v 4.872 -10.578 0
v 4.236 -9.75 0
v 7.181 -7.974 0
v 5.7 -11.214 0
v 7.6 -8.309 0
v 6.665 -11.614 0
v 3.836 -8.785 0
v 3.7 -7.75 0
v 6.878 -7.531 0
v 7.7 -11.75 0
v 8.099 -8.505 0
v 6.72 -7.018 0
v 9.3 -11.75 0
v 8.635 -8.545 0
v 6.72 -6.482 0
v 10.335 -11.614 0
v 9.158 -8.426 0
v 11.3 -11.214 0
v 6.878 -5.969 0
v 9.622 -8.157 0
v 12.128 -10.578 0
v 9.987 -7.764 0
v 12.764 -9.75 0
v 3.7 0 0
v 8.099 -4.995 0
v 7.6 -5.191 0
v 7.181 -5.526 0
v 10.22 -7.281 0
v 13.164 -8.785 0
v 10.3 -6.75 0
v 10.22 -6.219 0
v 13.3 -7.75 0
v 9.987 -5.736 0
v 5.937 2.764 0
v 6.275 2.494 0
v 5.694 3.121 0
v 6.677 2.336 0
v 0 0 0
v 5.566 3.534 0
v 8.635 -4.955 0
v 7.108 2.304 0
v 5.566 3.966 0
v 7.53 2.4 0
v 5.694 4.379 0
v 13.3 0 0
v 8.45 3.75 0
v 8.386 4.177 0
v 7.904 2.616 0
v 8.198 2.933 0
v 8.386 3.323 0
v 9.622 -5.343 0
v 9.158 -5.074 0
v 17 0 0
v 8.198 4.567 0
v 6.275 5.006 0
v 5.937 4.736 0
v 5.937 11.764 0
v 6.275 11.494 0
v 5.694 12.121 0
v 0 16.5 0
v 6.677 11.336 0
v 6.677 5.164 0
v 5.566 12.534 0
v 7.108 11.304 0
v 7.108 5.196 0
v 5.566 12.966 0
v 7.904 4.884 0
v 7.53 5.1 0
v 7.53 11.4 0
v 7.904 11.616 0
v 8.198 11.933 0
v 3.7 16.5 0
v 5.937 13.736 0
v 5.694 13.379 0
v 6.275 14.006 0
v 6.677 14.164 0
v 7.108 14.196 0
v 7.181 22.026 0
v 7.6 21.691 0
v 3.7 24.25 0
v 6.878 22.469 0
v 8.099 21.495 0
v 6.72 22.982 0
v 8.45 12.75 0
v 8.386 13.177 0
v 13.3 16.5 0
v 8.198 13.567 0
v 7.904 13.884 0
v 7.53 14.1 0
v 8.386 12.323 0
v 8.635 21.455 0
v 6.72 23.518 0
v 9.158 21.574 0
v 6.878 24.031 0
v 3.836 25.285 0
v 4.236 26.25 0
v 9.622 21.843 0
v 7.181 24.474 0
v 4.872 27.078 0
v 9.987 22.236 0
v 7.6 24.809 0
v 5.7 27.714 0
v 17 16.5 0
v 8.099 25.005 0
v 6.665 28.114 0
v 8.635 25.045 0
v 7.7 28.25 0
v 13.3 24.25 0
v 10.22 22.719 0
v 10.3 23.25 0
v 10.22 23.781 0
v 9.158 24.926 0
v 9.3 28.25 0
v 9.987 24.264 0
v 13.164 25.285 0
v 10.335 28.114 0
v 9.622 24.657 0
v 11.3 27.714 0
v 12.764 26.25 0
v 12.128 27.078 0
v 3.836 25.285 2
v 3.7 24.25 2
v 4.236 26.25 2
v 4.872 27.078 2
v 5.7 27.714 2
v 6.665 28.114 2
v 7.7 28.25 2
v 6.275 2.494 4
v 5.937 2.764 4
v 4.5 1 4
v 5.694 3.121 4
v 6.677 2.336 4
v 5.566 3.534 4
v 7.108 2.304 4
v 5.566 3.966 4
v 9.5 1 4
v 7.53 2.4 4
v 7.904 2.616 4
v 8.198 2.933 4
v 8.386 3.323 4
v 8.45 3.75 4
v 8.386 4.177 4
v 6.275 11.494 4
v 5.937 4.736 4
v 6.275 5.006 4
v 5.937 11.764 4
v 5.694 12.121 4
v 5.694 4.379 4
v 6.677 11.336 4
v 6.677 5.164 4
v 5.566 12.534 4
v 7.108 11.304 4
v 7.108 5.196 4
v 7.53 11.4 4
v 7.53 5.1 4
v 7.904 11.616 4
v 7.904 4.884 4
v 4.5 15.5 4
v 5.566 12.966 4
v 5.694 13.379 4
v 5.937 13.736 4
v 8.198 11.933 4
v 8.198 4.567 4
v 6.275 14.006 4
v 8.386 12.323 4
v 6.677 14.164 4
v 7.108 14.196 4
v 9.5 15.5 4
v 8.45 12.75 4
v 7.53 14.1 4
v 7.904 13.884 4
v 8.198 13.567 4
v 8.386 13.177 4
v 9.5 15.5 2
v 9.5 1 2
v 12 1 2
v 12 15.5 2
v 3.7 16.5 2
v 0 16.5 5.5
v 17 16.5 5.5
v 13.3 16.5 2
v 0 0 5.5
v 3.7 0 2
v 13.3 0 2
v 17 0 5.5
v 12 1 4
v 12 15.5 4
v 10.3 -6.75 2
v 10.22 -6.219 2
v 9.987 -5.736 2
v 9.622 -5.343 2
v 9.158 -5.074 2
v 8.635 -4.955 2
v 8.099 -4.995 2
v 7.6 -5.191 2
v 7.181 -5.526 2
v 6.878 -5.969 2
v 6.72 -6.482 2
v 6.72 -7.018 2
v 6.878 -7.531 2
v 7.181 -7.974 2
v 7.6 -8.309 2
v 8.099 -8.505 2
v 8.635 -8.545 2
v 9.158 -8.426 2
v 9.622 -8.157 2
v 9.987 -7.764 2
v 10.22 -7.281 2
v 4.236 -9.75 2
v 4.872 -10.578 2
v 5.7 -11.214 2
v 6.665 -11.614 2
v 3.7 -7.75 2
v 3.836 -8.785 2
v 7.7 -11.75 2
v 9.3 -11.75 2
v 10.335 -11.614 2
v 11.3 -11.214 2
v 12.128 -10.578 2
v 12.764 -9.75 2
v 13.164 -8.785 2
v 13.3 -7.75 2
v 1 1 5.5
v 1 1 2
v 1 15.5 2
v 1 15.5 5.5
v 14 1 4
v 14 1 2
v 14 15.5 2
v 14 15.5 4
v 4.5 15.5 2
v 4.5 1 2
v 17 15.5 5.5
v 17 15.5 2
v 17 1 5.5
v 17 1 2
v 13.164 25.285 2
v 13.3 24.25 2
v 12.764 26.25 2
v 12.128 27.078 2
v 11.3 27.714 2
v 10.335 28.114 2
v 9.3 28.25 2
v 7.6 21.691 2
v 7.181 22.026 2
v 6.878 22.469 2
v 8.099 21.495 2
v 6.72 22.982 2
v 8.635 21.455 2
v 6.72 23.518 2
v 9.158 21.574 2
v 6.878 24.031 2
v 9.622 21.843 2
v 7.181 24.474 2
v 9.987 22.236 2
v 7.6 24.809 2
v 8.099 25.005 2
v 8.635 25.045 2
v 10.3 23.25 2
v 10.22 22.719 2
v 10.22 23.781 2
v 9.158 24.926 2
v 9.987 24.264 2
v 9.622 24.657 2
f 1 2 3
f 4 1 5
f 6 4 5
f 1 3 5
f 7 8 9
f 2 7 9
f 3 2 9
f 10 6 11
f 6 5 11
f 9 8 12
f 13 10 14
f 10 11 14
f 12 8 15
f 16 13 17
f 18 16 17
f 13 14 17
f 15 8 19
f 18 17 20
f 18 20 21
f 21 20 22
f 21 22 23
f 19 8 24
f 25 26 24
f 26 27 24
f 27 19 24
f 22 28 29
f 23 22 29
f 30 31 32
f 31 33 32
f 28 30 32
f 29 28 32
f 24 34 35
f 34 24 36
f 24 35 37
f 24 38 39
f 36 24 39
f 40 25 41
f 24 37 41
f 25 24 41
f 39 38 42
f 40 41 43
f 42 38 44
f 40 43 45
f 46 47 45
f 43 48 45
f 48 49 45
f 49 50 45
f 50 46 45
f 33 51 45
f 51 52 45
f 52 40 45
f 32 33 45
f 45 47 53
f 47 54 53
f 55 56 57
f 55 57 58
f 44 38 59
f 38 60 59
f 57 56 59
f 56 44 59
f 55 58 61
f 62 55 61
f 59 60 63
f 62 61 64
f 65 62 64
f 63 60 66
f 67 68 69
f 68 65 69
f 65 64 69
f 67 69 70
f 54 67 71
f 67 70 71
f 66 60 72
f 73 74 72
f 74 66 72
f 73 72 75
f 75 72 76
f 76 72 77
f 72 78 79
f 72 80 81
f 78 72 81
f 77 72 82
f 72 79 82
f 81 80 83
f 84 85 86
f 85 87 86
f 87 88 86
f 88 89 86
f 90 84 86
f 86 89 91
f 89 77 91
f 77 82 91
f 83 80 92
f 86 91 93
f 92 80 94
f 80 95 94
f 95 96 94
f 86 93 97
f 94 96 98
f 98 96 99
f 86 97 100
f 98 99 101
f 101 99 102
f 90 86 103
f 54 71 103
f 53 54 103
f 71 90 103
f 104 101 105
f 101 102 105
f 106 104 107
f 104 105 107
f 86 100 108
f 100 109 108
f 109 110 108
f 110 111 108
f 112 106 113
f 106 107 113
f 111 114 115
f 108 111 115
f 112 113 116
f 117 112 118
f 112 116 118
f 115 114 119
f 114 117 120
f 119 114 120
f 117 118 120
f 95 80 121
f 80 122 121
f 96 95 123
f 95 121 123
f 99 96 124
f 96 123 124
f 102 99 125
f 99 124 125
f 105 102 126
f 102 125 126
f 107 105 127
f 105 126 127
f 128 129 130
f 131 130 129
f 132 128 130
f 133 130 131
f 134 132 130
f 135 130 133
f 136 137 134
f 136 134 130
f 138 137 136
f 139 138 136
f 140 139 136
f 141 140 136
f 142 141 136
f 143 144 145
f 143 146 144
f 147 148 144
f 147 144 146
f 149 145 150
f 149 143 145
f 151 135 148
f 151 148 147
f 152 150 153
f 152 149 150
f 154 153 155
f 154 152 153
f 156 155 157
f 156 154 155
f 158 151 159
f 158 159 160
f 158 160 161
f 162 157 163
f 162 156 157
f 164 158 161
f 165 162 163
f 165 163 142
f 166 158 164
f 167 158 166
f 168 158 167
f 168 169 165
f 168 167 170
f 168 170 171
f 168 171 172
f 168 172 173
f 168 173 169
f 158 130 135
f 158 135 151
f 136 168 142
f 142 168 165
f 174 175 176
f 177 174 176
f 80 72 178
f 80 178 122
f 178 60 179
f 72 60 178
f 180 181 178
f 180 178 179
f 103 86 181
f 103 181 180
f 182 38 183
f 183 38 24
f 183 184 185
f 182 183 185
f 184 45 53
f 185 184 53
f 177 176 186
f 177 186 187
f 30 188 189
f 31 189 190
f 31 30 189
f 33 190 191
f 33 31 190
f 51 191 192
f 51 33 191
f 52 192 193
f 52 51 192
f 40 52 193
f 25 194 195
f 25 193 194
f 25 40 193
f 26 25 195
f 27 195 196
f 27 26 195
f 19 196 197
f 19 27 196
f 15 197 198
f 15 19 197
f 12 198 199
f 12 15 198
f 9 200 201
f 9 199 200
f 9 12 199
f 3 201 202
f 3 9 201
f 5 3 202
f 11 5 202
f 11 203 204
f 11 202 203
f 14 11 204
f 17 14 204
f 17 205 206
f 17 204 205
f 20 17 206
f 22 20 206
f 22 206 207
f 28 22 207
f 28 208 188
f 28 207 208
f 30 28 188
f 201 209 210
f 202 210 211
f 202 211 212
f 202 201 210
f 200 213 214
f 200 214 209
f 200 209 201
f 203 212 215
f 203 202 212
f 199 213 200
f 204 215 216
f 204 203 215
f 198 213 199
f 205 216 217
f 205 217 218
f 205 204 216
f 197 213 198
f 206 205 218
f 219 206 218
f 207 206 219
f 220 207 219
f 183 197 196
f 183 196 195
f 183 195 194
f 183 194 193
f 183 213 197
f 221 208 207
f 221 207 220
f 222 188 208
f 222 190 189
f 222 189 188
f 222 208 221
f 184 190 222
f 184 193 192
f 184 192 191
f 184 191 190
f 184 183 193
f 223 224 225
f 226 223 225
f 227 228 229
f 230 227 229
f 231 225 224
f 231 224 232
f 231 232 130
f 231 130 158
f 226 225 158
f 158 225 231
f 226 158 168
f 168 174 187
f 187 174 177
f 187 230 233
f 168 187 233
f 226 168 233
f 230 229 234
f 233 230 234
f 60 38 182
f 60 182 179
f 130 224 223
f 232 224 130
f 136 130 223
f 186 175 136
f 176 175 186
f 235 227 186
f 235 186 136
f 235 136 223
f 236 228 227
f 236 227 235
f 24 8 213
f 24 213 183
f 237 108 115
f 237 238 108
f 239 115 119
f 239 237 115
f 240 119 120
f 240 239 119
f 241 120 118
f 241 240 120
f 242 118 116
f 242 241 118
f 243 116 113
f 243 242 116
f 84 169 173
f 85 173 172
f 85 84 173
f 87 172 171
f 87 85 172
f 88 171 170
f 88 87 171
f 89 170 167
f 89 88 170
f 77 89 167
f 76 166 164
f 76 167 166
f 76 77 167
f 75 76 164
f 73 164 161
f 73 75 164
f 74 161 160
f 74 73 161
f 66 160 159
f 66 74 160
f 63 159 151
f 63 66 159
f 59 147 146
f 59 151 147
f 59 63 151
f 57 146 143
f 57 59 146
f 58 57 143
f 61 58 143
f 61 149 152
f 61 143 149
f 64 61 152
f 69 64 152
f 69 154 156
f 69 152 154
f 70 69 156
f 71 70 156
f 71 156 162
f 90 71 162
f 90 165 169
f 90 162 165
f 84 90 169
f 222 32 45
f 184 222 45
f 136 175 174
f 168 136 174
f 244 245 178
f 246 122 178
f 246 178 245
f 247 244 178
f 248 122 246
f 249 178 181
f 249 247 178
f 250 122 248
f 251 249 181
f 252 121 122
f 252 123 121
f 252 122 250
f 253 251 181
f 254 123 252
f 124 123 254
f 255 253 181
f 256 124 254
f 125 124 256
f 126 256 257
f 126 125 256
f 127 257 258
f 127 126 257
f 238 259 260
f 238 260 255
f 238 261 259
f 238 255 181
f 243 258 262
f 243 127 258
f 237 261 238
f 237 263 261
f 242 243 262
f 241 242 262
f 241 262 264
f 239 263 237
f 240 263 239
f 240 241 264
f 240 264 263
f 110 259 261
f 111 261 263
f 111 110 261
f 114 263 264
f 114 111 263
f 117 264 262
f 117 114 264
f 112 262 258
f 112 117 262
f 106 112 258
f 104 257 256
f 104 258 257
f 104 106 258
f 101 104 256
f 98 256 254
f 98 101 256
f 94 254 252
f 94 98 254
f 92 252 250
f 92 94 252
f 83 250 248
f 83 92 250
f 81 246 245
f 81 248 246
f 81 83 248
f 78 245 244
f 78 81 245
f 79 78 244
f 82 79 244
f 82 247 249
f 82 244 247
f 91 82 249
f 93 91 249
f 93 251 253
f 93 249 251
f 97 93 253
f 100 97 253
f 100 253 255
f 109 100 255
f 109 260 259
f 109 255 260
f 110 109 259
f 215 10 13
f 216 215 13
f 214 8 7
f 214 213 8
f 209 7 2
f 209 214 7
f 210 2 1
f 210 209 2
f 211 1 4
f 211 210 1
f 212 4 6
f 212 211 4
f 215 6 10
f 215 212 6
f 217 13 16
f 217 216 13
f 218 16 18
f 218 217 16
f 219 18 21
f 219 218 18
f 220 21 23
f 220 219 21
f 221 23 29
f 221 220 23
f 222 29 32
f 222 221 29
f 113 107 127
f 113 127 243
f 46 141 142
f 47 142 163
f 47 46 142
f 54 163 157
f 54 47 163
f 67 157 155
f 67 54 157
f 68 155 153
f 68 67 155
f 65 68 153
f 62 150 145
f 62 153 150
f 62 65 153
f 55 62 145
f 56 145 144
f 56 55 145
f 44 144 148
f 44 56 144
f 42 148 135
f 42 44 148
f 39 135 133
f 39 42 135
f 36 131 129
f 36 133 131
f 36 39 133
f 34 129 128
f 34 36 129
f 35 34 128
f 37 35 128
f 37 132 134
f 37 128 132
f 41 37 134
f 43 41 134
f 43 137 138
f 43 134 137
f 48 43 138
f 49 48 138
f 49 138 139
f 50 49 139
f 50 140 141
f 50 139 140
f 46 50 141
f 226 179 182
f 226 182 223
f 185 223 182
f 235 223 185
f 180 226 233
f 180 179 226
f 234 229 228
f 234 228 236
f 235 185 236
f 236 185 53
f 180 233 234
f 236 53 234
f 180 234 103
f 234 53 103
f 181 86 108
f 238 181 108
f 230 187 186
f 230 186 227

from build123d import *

# Parameters (mm, degrees)
CYLINDER_R        = 1.45
CYLINDER_DEPTH    = 20
ARRAY_Y_COUNT     = 2
ARRAY_Y_PITCH     = 9
BOX002_W          = 5
BOX002_H          = 14.5
BOX002_DEPTH      = 2
BOX003_W          = 2
BOX003_H          = 14.5
BOX003_DEPTH      = 2
CYLINDER001_R     = 1.8
CYLINDER001_DEPTH = 10
ARRAY002_Y_COUNT  = 2
ARRAY002_Y_PITCH  = 30
BOX004_W          = 9.6
BOX004_H          = 40
BOX004_DEPTH      = 2
FILLET_R          = 4
BOX001_W          = 16
BOX001_H          = 14.5
BOX001_DEPTH      = 3.5
BOX_W             = 17
BOX_H             = 16.5
BOX_DEPTH         = 5.5


with BuildPart() as hole_array:
    # Cylinder → Cylinder (new body)
    with BuildSketch(Plane(origin=(7, 3.75, 0), x_dir=(1, 0, 0), z_dir=(0, 0, 1))):
        Circle(CYLINDER_R)
    extrude(amount=CYLINDER_DEPTH)

    # Array Y: hole array ×2


with BuildPart() as hole_array_1:
    add(hole_array.part)
    with Locations(*[(0, i * ARRAY_Y_PITCH, 0) for i in range(1, ARRAY_Y_COUNT)]):
        add(hole_array.part)


with BuildPart() as hole_stand_cube:
    # Box002 → Box002 (new body)
    with BuildSketch(Plane(origin=(4.5, 1, 2), x_dir=(1, 0, 0), z_dir=(0, 0, 1))):
        with Locations((2.5, 7.25)):
            Rectangle(BOX002_W, BOX002_H)
    extrude(amount=BOX002_DEPTH)


with BuildPart() as underplate_cube:
    # Box003 → Box003 (new body)
    with BuildSketch(Plane(origin=(12, 1, 2), x_dir=(1, 0, 0), z_dir=(0, 0, 1))):
        with Locations((1, 7.25)):
            Rectangle(BOX003_W, BOX003_H)
    extrude(amount=BOX003_DEPTH)


with BuildPart() as attach_hole_array:
    # Cylinder001 → Cylinder001 (new body)
    with BuildSketch(Plane(origin=(4.8, 5, 0), x_dir=(1, 0, 0), z_dir=(0, 0, 1))):
        Circle(CYLINDER001_R)
    extrude(amount=CYLINDER001_DEPTH)

    # Array002 Y: attach hole array ×2


with BuildPart() as attach_hole_array_1:
    add(attach_hole_array.part)
    with Locations(*[(0, i * ARRAY002_Y_PITCH, 0) for i in range(1, ARRAY002_Y_COUNT)]):
        add(attach_hole_array.part)


with BuildPart() as attach_plane:
    # Box004 → Box004 (new body)
    with BuildSketch(Plane.XY):
        with Locations((4.8, 20)):
            Rectangle(BOX004_W, BOX004_H)
    extrude(amount=BOX004_DEPTH)

    # Fillet
    fillet_edges = [attach_plane.edges().sort_by_distance(p)[0] for p in [
        (0, 0, 1),
        (0, 40, 1),
        (9.6, 0, 1),
        (9.6, 40, 1),
    ]]
    fillet(fillet_edges, radius=FILLET_R)

    # Cut002: cut attach hole array
    add(attach_hole_array_1.part, mode=Mode.SUBTRACT)


with BuildPart() as attach_plane_1:
    # Cut002 placement: moved
    add(attach_plane.part.moved(Location((3.7, -11.75, 0))))


with BuildPart() as bottom_cube_extract:
    # Box001 → Box001 (new body)
    with BuildSketch(Plane(origin=(1, 1, 2), x_dir=(1, 0, 0), z_dir=(0, 0, 1))):
        with Locations((8, 7.25)):
            Rectangle(BOX001_W, BOX001_H)
    extrude(amount=BOX001_DEPTH)


with BuildPart() as microusb_upper_cut:
    # Box → Box (new body)
    with BuildSketch(Plane.XY):
        with Locations((8.5, 8.25)):
            Rectangle(BOX_W, BOX_H)
    extrude(amount=BOX_DEPTH)

    # Cut: cut bottom cube extract
    add(bottom_cube_extract.part, mode=Mode.SUBTRACT)

    # Fusion: union hole stand cube, underplate cube, attach plane
    add(hole_stand_cube.part)
    add(underplate_cube.part)
    add(attach_plane_1.part)

    # Cut001: cut hole array
    add(hole_array_1.part, mode=Mode.SUBTRACT)


solid = microusb_upper_cut.part
